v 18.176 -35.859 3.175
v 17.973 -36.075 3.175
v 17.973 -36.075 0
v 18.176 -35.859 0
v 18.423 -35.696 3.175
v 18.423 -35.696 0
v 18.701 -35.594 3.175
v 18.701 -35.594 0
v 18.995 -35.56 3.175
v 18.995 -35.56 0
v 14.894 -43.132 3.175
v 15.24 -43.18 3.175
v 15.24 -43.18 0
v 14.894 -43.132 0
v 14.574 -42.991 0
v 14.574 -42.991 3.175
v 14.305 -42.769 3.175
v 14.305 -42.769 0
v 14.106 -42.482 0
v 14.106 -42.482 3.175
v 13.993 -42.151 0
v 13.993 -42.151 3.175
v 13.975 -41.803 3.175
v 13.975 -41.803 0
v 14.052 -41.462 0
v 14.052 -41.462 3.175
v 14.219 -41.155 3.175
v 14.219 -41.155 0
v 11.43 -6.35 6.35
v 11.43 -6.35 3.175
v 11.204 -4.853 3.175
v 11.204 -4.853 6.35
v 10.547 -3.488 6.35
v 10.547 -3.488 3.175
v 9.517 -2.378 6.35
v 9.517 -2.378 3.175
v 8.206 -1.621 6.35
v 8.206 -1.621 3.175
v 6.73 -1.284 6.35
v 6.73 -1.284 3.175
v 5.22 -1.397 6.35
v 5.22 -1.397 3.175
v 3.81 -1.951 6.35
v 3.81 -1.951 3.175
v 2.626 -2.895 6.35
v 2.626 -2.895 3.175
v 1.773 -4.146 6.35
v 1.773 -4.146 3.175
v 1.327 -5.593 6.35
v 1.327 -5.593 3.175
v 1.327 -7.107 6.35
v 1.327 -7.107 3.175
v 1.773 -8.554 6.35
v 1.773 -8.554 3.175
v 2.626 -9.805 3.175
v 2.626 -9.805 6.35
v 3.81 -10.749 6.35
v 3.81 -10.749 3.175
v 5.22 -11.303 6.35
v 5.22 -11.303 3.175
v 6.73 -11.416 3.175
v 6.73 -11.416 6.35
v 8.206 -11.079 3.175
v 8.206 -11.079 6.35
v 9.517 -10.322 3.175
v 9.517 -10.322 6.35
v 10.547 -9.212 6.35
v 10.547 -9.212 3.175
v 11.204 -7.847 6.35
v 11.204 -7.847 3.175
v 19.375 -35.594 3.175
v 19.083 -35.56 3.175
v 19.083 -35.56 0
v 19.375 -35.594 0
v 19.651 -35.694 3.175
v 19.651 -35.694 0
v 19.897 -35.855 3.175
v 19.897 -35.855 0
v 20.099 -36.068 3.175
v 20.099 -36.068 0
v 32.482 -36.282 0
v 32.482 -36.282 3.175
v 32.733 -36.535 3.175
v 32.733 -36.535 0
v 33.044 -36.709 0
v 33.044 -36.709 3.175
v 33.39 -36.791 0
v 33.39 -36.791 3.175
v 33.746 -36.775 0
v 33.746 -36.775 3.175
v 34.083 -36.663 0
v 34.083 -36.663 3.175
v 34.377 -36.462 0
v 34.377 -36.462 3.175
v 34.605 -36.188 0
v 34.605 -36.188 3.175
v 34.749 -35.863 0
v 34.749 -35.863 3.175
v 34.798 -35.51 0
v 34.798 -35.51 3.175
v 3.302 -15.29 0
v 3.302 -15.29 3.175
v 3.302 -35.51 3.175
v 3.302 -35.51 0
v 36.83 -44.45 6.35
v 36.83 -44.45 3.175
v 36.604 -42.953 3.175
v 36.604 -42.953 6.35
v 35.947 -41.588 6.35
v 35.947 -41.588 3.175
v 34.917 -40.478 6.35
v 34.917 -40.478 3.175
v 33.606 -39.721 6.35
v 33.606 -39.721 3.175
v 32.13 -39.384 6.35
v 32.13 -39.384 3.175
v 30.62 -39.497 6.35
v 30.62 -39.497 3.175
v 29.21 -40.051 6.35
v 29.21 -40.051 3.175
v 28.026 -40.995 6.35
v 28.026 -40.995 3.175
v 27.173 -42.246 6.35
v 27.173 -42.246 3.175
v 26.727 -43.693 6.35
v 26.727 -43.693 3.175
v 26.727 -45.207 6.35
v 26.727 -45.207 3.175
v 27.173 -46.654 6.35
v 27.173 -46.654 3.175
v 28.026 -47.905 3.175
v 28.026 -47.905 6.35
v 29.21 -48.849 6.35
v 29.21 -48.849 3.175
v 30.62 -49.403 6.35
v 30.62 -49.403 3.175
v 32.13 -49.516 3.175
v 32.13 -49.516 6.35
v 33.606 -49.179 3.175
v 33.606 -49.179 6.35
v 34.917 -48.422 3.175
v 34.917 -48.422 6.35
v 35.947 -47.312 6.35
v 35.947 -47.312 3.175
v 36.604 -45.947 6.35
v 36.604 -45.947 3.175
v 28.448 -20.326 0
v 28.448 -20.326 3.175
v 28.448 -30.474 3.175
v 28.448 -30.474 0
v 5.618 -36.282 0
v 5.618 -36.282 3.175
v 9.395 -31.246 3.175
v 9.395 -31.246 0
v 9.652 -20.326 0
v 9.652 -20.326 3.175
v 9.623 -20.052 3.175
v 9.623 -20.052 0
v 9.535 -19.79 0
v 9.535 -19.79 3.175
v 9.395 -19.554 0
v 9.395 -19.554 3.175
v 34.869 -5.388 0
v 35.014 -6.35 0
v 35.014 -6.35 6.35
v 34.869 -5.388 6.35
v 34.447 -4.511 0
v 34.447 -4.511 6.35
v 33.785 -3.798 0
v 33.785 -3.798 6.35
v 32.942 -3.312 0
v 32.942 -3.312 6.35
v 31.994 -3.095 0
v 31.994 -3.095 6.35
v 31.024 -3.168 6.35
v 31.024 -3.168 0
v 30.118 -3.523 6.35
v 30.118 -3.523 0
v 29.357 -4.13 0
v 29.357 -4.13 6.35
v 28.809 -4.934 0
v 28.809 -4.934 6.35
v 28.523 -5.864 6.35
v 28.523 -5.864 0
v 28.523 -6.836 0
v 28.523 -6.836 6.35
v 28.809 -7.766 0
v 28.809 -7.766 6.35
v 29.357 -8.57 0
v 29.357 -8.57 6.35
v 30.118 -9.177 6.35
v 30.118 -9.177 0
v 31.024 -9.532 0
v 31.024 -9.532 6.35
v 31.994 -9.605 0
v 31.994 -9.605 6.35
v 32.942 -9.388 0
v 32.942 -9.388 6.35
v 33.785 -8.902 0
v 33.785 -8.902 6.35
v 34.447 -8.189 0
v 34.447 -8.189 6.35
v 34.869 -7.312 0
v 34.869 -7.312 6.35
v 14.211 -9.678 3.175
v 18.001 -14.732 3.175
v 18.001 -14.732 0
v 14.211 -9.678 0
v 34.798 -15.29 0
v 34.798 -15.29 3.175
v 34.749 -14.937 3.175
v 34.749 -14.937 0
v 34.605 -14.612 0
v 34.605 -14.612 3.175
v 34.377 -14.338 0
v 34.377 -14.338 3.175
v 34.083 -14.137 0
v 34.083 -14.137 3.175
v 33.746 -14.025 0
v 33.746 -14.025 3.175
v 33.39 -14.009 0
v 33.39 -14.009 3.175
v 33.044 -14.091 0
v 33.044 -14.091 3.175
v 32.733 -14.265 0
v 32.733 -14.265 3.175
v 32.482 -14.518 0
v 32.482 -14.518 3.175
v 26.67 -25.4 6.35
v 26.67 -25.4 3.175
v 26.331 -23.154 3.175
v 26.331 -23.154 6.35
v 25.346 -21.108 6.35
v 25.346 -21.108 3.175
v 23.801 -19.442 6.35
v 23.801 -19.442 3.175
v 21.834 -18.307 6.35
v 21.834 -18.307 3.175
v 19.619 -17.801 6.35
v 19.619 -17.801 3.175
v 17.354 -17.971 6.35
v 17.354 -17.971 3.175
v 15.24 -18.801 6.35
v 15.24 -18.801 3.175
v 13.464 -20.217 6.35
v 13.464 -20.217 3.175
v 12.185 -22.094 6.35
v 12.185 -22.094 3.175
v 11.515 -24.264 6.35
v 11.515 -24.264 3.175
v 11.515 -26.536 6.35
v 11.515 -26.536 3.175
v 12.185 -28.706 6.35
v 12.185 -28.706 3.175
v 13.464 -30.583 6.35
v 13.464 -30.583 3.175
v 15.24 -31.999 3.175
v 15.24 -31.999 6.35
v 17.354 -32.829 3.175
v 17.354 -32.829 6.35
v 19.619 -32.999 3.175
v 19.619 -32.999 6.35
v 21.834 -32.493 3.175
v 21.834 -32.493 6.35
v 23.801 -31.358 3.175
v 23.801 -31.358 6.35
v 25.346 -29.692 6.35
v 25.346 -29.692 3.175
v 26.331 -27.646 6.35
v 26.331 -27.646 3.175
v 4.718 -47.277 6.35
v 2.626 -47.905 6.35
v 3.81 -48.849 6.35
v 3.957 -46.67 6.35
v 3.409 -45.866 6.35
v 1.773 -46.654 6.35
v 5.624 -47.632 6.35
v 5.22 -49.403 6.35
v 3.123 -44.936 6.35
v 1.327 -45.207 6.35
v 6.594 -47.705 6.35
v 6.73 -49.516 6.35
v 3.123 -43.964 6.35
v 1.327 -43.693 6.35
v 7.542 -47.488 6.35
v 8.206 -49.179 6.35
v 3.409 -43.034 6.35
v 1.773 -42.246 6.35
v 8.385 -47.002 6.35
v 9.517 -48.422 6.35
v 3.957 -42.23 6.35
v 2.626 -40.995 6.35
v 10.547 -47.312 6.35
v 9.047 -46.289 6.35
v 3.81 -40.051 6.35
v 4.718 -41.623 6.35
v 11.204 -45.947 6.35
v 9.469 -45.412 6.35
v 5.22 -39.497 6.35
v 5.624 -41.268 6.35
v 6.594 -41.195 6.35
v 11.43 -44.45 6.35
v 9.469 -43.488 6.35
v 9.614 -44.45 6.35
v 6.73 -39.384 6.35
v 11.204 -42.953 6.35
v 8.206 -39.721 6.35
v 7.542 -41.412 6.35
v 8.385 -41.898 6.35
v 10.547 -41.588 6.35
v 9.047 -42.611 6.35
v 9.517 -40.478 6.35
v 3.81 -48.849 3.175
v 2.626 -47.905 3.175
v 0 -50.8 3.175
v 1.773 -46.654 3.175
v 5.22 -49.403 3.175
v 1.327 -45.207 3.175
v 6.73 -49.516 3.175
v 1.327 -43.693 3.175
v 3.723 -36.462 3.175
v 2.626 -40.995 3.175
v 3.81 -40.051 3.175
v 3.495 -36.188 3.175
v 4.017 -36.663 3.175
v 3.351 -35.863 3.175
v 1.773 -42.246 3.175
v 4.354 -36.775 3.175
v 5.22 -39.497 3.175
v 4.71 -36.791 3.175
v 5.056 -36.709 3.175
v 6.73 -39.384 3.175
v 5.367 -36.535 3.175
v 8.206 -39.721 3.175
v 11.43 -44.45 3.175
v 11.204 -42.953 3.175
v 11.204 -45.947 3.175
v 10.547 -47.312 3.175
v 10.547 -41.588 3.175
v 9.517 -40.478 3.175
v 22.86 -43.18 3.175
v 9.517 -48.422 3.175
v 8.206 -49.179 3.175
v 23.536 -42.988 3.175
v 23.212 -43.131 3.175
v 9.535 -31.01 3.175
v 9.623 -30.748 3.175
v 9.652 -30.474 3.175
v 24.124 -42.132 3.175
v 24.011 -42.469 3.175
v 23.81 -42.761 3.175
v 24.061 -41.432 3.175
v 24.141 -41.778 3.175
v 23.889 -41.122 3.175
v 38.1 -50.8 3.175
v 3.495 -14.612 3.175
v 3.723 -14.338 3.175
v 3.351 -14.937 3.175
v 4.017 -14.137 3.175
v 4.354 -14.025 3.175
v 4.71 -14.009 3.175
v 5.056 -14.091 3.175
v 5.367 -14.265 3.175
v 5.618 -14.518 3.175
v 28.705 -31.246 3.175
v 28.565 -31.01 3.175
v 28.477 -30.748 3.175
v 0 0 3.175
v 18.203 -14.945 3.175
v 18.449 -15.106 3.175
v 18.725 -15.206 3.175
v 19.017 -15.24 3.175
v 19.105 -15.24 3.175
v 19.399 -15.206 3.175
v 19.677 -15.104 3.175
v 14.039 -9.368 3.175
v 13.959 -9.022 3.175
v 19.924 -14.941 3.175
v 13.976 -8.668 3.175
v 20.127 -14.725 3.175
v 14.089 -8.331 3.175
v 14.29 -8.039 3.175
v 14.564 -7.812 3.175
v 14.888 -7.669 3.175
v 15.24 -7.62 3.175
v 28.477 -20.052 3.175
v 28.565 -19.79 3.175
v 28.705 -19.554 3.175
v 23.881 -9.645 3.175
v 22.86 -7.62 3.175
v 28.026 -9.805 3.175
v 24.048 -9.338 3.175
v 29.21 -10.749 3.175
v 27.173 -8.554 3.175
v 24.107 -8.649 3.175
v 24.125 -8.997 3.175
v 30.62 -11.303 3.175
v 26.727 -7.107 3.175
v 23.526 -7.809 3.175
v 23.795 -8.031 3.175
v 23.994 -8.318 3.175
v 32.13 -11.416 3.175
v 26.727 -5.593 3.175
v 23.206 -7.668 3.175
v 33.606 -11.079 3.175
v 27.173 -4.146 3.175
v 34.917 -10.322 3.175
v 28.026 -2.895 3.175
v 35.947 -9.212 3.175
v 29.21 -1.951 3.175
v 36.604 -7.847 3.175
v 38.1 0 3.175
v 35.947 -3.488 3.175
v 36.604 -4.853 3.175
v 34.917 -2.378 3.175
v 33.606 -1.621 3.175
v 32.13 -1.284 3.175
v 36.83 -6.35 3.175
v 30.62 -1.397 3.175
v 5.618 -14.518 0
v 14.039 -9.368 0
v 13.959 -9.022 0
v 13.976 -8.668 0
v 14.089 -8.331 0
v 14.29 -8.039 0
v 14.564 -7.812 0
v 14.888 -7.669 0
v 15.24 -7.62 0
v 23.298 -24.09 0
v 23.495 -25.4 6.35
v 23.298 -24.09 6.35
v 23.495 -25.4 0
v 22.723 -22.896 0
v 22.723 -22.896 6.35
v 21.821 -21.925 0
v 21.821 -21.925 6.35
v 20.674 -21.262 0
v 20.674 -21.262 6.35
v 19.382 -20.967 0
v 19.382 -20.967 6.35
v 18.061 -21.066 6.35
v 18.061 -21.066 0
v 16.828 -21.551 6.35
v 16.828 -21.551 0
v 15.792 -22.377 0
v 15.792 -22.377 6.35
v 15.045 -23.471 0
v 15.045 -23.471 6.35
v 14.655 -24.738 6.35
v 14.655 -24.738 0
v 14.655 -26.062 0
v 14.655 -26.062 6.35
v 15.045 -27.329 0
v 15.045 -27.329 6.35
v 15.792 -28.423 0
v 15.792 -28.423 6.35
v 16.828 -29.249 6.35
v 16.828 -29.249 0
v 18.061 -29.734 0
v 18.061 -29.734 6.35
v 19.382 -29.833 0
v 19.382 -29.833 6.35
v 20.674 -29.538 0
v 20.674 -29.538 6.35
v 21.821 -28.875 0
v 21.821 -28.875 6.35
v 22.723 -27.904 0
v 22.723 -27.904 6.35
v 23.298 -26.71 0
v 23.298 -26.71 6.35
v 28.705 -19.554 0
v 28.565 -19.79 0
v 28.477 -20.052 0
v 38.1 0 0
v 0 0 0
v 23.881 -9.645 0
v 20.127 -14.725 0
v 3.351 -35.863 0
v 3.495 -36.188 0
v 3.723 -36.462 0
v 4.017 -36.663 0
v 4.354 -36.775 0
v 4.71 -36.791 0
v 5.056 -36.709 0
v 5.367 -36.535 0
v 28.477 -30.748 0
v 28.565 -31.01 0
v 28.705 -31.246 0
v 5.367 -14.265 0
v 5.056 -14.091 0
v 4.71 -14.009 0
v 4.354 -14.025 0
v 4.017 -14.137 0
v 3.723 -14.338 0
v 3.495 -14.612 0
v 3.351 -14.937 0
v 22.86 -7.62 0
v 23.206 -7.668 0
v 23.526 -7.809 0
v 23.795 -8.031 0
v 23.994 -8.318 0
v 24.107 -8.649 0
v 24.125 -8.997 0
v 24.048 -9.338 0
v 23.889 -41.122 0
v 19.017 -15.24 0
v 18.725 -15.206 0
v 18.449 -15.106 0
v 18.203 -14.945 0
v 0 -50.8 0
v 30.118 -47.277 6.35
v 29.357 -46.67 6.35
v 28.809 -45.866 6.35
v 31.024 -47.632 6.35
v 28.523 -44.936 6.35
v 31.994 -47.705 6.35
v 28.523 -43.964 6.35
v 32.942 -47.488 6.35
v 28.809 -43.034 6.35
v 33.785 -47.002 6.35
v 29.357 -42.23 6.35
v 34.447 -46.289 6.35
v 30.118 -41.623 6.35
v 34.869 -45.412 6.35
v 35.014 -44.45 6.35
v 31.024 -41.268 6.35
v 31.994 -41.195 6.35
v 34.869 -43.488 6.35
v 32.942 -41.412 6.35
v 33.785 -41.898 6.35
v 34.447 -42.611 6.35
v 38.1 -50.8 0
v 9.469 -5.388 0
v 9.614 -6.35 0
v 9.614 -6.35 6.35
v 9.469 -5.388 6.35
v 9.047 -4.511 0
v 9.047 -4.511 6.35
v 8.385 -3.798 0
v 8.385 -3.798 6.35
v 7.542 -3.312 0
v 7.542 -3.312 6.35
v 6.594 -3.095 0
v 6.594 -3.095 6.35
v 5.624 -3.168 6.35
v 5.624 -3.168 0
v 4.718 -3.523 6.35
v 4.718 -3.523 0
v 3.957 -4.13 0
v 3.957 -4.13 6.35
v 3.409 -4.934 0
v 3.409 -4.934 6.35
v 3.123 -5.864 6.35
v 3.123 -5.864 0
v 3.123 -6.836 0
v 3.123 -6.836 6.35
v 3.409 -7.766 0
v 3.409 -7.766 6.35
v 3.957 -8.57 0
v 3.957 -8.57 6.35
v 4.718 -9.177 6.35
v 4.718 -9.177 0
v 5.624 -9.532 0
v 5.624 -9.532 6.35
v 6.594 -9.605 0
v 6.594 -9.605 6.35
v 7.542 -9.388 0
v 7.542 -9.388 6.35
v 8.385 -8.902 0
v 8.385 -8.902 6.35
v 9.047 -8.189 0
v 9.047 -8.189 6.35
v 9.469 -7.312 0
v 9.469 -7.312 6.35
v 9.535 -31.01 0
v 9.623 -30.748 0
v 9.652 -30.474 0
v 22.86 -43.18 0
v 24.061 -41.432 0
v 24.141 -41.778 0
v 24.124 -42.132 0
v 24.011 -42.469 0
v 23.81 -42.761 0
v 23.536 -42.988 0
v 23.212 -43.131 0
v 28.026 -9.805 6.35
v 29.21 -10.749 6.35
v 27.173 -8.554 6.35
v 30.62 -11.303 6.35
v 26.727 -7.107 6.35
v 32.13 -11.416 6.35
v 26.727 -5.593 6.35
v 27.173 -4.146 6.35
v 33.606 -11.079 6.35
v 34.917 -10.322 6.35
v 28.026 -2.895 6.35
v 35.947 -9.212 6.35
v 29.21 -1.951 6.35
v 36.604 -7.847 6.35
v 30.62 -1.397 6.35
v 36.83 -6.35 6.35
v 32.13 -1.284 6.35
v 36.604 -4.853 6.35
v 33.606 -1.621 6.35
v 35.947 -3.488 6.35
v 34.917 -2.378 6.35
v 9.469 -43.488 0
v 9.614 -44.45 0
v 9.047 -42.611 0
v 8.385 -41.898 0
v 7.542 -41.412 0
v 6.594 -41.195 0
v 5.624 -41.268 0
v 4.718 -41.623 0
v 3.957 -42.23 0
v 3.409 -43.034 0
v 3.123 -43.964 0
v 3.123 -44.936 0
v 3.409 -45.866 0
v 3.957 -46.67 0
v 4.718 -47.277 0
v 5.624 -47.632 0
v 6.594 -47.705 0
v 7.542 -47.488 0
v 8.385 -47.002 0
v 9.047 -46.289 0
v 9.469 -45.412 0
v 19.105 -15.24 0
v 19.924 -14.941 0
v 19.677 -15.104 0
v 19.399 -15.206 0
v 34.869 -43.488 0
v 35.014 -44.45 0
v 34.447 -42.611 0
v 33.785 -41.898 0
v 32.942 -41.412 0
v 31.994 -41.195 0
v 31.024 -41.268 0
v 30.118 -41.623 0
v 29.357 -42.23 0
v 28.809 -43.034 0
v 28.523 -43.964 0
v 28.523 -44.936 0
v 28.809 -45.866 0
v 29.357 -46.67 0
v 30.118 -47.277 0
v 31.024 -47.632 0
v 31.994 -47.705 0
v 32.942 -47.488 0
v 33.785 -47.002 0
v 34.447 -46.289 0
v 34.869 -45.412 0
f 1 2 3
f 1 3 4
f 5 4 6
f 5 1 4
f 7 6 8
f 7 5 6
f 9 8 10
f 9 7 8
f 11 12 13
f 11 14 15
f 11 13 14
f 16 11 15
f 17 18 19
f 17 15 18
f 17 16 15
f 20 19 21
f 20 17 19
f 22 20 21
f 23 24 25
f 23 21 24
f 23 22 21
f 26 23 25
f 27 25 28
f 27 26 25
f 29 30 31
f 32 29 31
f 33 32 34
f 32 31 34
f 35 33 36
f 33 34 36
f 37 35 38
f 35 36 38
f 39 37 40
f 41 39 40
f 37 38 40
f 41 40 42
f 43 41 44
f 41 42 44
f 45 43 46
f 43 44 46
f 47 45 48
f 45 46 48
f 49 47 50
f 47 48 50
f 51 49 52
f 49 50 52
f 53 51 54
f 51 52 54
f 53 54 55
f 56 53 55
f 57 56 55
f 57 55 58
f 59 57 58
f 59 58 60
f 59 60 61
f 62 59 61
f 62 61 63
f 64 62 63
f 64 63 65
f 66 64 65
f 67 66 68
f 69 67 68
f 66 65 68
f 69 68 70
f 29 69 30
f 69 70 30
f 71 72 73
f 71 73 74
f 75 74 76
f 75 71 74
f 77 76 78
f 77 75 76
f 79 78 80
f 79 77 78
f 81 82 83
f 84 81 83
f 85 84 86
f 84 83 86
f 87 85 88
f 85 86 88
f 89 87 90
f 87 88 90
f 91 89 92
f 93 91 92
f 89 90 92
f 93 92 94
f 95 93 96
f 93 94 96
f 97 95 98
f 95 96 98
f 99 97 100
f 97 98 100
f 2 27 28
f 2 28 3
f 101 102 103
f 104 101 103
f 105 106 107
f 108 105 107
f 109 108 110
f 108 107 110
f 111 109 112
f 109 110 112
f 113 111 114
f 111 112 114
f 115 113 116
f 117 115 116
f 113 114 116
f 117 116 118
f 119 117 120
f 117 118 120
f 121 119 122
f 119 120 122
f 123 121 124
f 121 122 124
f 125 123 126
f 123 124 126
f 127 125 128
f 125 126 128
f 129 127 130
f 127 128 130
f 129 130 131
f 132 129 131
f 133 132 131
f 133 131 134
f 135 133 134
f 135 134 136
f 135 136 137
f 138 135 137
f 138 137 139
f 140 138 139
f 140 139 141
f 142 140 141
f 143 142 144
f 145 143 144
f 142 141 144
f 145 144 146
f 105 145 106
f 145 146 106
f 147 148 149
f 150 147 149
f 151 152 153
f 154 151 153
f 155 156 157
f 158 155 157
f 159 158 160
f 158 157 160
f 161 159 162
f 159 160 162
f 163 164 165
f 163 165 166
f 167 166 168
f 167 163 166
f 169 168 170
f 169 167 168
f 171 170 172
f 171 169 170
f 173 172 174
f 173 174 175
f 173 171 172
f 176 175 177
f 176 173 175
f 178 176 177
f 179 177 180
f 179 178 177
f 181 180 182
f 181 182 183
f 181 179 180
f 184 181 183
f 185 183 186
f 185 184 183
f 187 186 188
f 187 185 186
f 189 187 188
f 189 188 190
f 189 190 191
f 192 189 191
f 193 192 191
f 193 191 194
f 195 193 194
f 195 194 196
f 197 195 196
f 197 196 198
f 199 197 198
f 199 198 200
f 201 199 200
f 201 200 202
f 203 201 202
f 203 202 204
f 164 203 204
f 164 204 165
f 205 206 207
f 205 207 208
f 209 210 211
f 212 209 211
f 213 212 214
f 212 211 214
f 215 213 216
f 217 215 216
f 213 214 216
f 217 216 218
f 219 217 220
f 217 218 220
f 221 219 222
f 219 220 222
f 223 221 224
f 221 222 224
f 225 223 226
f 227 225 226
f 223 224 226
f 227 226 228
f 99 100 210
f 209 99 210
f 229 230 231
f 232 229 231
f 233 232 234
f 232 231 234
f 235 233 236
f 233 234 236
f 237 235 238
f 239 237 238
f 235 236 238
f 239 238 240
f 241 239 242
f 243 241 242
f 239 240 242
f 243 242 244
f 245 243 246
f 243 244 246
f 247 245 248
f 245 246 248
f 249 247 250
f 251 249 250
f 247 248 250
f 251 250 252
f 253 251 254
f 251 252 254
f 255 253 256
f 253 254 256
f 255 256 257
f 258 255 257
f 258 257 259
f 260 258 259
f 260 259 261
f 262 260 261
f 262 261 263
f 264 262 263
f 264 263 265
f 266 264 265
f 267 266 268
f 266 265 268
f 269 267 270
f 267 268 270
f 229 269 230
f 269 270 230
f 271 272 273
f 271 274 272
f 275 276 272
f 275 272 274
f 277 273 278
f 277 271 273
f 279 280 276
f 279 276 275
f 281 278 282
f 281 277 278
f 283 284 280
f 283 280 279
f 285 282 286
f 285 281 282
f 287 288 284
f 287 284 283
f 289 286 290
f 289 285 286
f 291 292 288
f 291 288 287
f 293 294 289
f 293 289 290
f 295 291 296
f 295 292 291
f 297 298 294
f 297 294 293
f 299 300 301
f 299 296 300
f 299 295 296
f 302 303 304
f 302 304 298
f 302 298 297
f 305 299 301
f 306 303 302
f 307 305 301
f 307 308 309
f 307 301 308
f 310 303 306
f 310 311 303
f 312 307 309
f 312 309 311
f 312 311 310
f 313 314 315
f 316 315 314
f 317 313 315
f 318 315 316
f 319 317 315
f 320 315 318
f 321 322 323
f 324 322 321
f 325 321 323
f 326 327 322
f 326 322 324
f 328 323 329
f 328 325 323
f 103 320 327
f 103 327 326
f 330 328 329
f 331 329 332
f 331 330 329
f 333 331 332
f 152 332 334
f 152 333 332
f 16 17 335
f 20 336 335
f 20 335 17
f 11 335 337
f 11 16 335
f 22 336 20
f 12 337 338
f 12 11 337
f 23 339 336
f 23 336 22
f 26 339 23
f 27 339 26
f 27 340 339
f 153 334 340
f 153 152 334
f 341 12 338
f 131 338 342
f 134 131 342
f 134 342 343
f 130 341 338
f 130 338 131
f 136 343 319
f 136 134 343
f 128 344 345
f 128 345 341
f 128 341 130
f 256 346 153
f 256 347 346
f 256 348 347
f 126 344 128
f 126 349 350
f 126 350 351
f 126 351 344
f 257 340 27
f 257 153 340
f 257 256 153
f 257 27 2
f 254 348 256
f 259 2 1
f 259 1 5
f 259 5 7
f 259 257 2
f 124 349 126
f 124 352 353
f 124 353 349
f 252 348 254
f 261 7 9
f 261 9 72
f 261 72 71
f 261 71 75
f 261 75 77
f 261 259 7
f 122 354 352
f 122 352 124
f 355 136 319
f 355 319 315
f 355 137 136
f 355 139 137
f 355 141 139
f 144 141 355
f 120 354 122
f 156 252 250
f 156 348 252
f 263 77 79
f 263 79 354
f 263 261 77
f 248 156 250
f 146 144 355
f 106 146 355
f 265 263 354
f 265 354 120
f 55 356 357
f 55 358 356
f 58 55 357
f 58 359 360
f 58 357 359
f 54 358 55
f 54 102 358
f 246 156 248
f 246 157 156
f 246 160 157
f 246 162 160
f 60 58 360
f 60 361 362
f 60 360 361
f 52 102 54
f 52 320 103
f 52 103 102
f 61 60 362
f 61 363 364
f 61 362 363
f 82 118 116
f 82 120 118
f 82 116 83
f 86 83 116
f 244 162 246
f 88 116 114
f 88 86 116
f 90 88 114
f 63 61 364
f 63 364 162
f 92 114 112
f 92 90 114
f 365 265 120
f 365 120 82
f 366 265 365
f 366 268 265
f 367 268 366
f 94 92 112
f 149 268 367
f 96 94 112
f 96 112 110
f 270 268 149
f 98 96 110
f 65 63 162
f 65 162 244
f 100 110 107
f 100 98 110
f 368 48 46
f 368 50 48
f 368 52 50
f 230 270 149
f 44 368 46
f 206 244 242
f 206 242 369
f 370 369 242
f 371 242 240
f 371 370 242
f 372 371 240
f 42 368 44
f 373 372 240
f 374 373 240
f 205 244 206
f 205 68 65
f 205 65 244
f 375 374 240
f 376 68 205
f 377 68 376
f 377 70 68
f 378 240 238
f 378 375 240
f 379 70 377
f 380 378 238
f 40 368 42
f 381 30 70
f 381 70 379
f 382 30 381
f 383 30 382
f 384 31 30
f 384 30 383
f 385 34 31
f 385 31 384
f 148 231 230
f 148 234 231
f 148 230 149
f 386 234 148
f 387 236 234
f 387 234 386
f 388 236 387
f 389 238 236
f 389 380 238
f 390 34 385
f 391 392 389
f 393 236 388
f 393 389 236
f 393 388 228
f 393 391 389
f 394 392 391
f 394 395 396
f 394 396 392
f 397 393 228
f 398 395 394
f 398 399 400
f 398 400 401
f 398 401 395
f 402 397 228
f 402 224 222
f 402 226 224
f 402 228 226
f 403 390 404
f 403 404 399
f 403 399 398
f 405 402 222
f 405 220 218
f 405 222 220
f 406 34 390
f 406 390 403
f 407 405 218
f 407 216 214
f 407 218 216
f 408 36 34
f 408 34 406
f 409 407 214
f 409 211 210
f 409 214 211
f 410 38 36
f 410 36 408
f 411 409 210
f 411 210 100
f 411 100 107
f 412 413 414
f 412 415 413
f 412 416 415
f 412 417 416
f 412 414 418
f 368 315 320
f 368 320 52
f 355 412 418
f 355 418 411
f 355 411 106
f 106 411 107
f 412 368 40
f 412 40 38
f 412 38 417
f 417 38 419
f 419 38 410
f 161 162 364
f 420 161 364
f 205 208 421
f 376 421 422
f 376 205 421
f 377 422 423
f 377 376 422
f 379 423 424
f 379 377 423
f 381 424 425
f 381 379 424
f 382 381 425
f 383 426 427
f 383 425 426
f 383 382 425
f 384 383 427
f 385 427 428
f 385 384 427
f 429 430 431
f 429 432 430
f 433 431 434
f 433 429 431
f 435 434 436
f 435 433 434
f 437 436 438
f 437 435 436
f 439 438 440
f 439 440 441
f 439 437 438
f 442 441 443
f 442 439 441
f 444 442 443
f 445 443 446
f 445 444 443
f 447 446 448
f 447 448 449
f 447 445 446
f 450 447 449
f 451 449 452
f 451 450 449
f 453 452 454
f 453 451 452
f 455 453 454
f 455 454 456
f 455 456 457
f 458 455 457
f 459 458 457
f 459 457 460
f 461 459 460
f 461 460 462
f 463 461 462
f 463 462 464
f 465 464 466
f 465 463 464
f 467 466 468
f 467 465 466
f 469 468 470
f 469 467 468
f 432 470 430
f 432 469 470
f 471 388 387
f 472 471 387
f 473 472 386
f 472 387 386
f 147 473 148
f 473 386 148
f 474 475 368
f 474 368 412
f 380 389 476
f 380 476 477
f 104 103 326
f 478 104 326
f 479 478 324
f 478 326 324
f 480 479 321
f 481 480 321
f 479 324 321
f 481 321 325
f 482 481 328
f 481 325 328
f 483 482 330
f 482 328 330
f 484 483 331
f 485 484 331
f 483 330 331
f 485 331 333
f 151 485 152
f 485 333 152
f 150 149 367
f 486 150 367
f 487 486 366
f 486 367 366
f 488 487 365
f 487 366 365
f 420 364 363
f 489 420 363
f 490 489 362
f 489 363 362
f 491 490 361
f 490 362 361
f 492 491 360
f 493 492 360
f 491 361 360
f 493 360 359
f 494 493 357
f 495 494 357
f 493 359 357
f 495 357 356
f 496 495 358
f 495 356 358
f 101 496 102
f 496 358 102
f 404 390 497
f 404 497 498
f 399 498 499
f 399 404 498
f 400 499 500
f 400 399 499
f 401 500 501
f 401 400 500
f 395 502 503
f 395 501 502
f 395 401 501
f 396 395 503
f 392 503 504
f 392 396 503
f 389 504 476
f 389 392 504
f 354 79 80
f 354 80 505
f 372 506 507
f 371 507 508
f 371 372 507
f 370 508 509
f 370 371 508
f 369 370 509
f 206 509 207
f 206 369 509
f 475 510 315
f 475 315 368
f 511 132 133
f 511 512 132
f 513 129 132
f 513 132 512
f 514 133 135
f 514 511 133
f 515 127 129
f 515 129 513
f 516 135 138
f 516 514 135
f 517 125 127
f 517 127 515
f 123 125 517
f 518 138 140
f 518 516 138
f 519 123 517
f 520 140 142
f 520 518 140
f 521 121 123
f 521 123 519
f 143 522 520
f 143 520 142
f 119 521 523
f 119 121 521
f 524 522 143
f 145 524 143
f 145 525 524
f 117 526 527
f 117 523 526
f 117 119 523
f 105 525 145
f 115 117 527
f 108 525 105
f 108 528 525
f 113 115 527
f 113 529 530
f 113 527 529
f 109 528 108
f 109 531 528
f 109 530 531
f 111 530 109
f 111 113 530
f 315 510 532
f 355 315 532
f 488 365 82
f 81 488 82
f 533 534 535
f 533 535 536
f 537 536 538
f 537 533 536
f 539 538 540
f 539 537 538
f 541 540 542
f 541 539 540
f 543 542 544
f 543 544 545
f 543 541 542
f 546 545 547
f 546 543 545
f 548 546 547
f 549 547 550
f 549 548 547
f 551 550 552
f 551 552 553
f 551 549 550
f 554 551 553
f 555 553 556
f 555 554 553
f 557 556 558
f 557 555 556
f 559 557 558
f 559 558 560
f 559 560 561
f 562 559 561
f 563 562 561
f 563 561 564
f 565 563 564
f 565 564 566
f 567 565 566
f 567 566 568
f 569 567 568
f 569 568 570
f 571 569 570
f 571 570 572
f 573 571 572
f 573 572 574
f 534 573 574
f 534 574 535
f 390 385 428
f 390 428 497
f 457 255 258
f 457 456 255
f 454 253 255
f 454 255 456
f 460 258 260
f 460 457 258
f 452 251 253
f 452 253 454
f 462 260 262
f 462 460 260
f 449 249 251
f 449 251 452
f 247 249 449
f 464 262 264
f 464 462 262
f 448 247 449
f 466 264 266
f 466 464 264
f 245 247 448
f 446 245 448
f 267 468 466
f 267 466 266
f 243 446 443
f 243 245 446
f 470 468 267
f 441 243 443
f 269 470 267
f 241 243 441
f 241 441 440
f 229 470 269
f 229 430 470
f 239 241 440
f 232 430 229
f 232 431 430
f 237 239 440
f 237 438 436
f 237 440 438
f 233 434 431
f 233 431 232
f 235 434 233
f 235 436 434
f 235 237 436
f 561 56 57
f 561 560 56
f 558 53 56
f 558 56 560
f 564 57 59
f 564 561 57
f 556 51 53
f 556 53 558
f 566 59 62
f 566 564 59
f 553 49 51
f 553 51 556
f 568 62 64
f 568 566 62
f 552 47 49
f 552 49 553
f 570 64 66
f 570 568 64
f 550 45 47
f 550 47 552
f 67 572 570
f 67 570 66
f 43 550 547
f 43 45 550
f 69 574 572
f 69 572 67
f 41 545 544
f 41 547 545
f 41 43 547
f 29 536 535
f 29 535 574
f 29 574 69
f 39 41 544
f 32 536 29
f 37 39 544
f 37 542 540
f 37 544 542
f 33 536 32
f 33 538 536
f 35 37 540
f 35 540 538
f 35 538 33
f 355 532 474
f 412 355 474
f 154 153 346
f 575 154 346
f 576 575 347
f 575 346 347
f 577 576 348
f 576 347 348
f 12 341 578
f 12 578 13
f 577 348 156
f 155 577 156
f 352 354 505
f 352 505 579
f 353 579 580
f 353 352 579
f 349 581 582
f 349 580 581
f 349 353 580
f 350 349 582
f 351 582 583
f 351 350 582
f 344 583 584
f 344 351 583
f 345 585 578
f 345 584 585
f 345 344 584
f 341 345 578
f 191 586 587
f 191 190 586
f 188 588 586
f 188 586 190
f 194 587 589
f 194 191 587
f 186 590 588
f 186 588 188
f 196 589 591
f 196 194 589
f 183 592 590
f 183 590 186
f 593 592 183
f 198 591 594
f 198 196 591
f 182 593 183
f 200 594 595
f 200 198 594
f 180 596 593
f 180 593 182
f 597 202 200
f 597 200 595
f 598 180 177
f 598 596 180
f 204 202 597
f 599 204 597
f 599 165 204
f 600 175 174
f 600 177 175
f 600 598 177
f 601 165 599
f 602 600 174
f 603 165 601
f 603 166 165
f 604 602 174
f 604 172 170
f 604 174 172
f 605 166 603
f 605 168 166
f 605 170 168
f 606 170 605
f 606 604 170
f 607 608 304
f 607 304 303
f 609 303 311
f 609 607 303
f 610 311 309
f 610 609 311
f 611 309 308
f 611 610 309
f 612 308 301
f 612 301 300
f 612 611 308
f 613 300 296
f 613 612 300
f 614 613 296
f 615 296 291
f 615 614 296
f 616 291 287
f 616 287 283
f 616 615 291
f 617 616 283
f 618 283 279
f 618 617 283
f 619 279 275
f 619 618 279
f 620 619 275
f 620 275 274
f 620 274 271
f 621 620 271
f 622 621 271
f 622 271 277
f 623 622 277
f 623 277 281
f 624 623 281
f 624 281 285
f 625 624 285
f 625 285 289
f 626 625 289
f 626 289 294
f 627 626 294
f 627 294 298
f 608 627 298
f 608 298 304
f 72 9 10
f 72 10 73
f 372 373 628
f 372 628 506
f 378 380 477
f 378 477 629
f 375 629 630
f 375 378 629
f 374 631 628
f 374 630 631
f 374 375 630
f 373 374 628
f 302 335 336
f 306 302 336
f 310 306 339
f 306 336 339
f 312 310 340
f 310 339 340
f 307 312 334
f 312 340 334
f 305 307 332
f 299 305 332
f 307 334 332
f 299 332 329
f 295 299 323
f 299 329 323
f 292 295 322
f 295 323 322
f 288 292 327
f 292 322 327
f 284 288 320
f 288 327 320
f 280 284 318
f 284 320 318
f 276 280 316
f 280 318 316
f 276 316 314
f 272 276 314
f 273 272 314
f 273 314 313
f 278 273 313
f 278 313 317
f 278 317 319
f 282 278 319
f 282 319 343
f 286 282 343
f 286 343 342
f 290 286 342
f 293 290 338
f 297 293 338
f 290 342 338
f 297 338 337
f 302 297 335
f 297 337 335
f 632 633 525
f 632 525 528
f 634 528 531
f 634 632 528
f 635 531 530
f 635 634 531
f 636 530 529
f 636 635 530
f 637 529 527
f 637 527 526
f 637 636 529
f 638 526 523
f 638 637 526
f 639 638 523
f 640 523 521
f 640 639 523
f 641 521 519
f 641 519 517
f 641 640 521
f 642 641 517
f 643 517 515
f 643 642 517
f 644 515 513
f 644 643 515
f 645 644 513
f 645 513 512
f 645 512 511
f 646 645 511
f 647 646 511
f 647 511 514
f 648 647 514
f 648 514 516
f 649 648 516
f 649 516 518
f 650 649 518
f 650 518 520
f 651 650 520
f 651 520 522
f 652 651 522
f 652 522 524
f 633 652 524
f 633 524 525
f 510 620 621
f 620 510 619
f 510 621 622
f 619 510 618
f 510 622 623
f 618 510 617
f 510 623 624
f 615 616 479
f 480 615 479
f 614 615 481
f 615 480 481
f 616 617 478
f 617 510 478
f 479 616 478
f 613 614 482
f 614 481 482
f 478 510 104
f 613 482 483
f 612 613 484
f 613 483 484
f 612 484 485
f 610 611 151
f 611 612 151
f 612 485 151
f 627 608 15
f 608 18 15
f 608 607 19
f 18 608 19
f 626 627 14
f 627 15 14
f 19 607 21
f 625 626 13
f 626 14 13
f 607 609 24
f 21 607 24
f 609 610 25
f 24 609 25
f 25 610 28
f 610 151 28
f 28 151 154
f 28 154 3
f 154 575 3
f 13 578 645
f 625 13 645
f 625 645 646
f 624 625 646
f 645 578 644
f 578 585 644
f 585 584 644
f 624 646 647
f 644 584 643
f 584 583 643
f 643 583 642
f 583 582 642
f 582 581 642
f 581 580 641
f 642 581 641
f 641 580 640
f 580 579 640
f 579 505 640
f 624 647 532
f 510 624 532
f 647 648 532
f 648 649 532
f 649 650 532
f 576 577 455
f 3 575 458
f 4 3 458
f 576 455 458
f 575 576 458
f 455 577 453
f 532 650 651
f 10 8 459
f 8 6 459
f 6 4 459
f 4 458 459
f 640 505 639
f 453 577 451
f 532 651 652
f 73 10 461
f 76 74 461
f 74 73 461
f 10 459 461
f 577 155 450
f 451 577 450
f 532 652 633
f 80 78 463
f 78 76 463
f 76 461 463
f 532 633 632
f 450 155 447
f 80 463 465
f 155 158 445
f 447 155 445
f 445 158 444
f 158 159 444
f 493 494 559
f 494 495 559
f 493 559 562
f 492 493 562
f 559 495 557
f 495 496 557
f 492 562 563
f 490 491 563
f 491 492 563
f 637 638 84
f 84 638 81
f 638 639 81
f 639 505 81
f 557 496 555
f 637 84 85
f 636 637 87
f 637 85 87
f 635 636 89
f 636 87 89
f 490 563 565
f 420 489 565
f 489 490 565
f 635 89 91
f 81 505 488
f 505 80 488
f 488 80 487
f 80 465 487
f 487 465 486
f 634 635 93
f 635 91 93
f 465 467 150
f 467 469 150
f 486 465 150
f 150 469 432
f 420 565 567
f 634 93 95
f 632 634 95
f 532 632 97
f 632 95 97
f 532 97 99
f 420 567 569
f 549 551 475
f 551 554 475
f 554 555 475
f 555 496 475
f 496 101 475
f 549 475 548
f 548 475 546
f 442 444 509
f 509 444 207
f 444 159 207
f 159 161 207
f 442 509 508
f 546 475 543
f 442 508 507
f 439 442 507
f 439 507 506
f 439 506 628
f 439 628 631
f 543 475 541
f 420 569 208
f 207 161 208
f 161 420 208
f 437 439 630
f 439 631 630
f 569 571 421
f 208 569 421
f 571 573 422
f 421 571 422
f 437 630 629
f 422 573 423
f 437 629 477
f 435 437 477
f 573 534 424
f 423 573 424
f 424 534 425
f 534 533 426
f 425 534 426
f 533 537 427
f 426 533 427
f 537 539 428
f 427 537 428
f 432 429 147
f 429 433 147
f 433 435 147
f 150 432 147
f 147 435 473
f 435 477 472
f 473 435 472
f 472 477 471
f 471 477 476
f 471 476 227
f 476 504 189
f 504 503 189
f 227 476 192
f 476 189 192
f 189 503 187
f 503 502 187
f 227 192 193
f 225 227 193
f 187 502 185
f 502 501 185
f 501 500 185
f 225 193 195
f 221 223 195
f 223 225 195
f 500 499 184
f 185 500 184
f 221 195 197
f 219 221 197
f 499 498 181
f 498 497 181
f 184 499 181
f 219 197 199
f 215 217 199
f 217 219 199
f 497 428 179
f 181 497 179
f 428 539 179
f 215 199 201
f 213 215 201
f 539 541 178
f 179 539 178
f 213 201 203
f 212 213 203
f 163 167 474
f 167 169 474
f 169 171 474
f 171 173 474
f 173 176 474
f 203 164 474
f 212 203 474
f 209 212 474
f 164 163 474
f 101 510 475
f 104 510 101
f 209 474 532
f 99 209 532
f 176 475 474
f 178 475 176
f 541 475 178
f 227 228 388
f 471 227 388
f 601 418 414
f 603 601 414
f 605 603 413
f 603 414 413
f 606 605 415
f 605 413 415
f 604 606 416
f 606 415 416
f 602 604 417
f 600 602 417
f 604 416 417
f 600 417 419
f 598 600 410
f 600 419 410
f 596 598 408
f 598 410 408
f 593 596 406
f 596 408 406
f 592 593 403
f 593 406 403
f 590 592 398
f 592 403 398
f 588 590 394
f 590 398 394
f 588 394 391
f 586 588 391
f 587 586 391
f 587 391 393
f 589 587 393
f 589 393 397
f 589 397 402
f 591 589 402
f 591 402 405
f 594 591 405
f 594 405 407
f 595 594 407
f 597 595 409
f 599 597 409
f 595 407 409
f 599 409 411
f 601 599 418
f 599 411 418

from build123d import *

# Parameters (mm, degrees)
SKETCH1_W                           = 38.1
SKETCH1_H                           = 50.8
SKETCH1_R                           = 3.2639
SKETCH1_R_2                         = 4.445
BASE_EXTRUDE_DEPTH                  = 3.175
SKETCH2_R                           = 7.62
SKETCH2_R_2                         = 4.445
SKETCH2_R_3                         = 5.08
SKETCH2_R_4                         = 3.2639
RAISER_DEPTH                        = 3.175
WEIGHT_REDUCTION_SCREW_ACCESS_DEPTH = 4.175


with BuildPart() as part:
    # Sketch1 → Base Extrude (new body)
    with BuildSketch(Plane.XY):
        with Locations((19.05, -25.4)):
            Rectangle(SKETCH1_W, SKETCH1_H)
        with Locations((6.35, -6.35)):
            Circle(SKETCH1_R, mode=Mode.SUBTRACT)
        with Locations((6.35, -44.45)):
            Circle(SKETCH1_R, mode=Mode.SUBTRACT)
        with Locations((31.75, -44.45)):
            Circle(SKETCH1_R, mode=Mode.SUBTRACT)
        with Locations((31.75, -6.35)):
            Circle(SKETCH1_R, mode=Mode.SUBTRACT)
        with Locations((19.05, -25.4)):
            Circle(SKETCH1_R_2, mode=Mode.SUBTRACT)
    extrude(amount=BASE_EXTRUDE_DEPTH)

    # Sketch2 → Raiser (add)
    with BuildSketch(Plane.XY.offset(3.175)):
        with Locations((19.05, -25.4)):
            Circle(SKETCH2_R)
        with Locations((19.05, -25.4)):
            Circle(SKETCH2_R_2, mode=Mode.SUBTRACT)
        with Locations((6.35, -6.35)):
            Circle(SKETCH2_R_3)
        with Locations((6.35, -6.35)):
            Circle(SKETCH2_R_4, mode=Mode.SUBTRACT)
        with Locations((31.75, -6.35)):
            Circle(SKETCH2_R_3)
        with Locations((31.75, -6.35)):
            Circle(SKETCH2_R_4, mode=Mode.SUBTRACT)
        with Locations((6.35, -44.45)):
            Circle(SKETCH2_R_3)
        with Locations((6.35, -44.45)):
            Circle(SKETCH2_R_4, mode=Mode.SUBTRACT)
        with Locations((31.75, -44.45)):
            Circle(SKETCH2_R_3)
        with Locations((31.75, -44.45)):
            Circle(SKETCH2_R_4, mode=Mode.SUBTRACT)
    extrude(amount=RAISER_DEPTH)

    # Sketch3 → Weight Reduction - screw access (cut, through all)
    with BuildSketch(Plane.XY.offset(3.175)):
        with BuildLine():
            Line((3.302, -15.289677034), (3.302, -35.510322966))
            ThreePointArc((3.302, -35.510322966), (4.181713329, -36.730860012), (5.617806221, -36.282258372))
            Line((5.617806221, -36.282258372), (9.394688198, -31.246415736))
            ThreePointArc((9.394688198, -31.246415736), (9.585978035, -30.881326012), (9.652, -30.47448033))
            Line((9.652, -30.47448033), (9.652, -20.32551967))
            ThreePointArc((9.652, -20.32551967), (9.585978035, -19.918673988), (9.394688198, -19.553584264))
            Line((9.394688198, -19.553584264), (5.617806221, -14.517741628))
            ThreePointArc((5.617806221, -14.517741628), (4.181713329, -14.069139988), (3.302, -15.289677034))
        make_face()
        with BuildLine():
            Line((15.24, -7.62), (22.86, -7.62))
            ThreePointArc((22.86, -7.62), (23.993921047, -8.318053273), (23.881326665, -9.644845576))
            Line((23.881326665, -9.644845576), (20.126783029, -14.724845576))
            ThreePointArc((20.126783029, -14.724845576), (19.677403092, -15.103921047), (19.105456364, -15.24))
            Line((19.105456364, -15.24), (19.016881977, -15.24))
            ThreePointArc((19.016881977, -15.24), (18.448920711, -15.105922533), (18.000881977, -14.732))
            Line((18.000881977, -14.732), (14.210752791, -9.678494418))
            ThreePointArc((14.210752791, -9.678494418), (14.089266637, -8.33119233), (15.24, -7.62))
        make_face()
        with BuildLine():
            Line((14.218673335, -41.155154424), (17.973216971, -36.075154424))
            ThreePointArc((17.973216971, -36.075154424), (18.422596908, -35.696078953), (18.994543636, -35.56))
            Line((18.994543636, -35.56), (19.083118023, -35.56))
            ThreePointArc((19.083118023, -35.56), (19.651079289, -35.694077467), (20.099118023, -36.068))
            Line((20.099118023, -36.068), (23.889247209, -41.121505582))
            ThreePointArc((23.889247209, -41.121505582), (24.010733363, -42.46880767), (22.86, -43.18))
            Line((22.86, -43.18), (15.24, -43.18))
            ThreePointArc((15.24, -43.18), (14.106078953, -42.481946727), (14.218673335, -41.155154424))
        make_face()
        with BuildLine():
            Line((28.705311802, -31.246415736), (32.482193779, -36.282258372))
            ThreePointArc((32.482193779, -36.282258372), (33.918286671, -36.730860012), (34.798, -35.510322966))
            Line((34.798, -35.510322966), (34.798, -15.289677034))
            ThreePointArc((34.798, -15.289677034), (33.918286671, -14.069139988), (32.482193779, -14.517741628))
            Line((32.482193779, -14.517741628), (28.705311802, -19.553584264))
            ThreePointArc((28.705311802, -19.553584264), (28.514021965, -19.918673988), (28.448, -20.32551967))
            Line((28.448, -20.32551967), (28.448, -30.47448033))
            ThreePointArc((28.448, -30.47448033), (28.514021965, -30.881326012), (28.705311802, -31.246415736))
        make_face()
    extrude(amount=-WEIGHT_REDUCTION_SCREW_ACCESS_DEPTH, mode=Mode.SUBTRACT)


solid = part.part
